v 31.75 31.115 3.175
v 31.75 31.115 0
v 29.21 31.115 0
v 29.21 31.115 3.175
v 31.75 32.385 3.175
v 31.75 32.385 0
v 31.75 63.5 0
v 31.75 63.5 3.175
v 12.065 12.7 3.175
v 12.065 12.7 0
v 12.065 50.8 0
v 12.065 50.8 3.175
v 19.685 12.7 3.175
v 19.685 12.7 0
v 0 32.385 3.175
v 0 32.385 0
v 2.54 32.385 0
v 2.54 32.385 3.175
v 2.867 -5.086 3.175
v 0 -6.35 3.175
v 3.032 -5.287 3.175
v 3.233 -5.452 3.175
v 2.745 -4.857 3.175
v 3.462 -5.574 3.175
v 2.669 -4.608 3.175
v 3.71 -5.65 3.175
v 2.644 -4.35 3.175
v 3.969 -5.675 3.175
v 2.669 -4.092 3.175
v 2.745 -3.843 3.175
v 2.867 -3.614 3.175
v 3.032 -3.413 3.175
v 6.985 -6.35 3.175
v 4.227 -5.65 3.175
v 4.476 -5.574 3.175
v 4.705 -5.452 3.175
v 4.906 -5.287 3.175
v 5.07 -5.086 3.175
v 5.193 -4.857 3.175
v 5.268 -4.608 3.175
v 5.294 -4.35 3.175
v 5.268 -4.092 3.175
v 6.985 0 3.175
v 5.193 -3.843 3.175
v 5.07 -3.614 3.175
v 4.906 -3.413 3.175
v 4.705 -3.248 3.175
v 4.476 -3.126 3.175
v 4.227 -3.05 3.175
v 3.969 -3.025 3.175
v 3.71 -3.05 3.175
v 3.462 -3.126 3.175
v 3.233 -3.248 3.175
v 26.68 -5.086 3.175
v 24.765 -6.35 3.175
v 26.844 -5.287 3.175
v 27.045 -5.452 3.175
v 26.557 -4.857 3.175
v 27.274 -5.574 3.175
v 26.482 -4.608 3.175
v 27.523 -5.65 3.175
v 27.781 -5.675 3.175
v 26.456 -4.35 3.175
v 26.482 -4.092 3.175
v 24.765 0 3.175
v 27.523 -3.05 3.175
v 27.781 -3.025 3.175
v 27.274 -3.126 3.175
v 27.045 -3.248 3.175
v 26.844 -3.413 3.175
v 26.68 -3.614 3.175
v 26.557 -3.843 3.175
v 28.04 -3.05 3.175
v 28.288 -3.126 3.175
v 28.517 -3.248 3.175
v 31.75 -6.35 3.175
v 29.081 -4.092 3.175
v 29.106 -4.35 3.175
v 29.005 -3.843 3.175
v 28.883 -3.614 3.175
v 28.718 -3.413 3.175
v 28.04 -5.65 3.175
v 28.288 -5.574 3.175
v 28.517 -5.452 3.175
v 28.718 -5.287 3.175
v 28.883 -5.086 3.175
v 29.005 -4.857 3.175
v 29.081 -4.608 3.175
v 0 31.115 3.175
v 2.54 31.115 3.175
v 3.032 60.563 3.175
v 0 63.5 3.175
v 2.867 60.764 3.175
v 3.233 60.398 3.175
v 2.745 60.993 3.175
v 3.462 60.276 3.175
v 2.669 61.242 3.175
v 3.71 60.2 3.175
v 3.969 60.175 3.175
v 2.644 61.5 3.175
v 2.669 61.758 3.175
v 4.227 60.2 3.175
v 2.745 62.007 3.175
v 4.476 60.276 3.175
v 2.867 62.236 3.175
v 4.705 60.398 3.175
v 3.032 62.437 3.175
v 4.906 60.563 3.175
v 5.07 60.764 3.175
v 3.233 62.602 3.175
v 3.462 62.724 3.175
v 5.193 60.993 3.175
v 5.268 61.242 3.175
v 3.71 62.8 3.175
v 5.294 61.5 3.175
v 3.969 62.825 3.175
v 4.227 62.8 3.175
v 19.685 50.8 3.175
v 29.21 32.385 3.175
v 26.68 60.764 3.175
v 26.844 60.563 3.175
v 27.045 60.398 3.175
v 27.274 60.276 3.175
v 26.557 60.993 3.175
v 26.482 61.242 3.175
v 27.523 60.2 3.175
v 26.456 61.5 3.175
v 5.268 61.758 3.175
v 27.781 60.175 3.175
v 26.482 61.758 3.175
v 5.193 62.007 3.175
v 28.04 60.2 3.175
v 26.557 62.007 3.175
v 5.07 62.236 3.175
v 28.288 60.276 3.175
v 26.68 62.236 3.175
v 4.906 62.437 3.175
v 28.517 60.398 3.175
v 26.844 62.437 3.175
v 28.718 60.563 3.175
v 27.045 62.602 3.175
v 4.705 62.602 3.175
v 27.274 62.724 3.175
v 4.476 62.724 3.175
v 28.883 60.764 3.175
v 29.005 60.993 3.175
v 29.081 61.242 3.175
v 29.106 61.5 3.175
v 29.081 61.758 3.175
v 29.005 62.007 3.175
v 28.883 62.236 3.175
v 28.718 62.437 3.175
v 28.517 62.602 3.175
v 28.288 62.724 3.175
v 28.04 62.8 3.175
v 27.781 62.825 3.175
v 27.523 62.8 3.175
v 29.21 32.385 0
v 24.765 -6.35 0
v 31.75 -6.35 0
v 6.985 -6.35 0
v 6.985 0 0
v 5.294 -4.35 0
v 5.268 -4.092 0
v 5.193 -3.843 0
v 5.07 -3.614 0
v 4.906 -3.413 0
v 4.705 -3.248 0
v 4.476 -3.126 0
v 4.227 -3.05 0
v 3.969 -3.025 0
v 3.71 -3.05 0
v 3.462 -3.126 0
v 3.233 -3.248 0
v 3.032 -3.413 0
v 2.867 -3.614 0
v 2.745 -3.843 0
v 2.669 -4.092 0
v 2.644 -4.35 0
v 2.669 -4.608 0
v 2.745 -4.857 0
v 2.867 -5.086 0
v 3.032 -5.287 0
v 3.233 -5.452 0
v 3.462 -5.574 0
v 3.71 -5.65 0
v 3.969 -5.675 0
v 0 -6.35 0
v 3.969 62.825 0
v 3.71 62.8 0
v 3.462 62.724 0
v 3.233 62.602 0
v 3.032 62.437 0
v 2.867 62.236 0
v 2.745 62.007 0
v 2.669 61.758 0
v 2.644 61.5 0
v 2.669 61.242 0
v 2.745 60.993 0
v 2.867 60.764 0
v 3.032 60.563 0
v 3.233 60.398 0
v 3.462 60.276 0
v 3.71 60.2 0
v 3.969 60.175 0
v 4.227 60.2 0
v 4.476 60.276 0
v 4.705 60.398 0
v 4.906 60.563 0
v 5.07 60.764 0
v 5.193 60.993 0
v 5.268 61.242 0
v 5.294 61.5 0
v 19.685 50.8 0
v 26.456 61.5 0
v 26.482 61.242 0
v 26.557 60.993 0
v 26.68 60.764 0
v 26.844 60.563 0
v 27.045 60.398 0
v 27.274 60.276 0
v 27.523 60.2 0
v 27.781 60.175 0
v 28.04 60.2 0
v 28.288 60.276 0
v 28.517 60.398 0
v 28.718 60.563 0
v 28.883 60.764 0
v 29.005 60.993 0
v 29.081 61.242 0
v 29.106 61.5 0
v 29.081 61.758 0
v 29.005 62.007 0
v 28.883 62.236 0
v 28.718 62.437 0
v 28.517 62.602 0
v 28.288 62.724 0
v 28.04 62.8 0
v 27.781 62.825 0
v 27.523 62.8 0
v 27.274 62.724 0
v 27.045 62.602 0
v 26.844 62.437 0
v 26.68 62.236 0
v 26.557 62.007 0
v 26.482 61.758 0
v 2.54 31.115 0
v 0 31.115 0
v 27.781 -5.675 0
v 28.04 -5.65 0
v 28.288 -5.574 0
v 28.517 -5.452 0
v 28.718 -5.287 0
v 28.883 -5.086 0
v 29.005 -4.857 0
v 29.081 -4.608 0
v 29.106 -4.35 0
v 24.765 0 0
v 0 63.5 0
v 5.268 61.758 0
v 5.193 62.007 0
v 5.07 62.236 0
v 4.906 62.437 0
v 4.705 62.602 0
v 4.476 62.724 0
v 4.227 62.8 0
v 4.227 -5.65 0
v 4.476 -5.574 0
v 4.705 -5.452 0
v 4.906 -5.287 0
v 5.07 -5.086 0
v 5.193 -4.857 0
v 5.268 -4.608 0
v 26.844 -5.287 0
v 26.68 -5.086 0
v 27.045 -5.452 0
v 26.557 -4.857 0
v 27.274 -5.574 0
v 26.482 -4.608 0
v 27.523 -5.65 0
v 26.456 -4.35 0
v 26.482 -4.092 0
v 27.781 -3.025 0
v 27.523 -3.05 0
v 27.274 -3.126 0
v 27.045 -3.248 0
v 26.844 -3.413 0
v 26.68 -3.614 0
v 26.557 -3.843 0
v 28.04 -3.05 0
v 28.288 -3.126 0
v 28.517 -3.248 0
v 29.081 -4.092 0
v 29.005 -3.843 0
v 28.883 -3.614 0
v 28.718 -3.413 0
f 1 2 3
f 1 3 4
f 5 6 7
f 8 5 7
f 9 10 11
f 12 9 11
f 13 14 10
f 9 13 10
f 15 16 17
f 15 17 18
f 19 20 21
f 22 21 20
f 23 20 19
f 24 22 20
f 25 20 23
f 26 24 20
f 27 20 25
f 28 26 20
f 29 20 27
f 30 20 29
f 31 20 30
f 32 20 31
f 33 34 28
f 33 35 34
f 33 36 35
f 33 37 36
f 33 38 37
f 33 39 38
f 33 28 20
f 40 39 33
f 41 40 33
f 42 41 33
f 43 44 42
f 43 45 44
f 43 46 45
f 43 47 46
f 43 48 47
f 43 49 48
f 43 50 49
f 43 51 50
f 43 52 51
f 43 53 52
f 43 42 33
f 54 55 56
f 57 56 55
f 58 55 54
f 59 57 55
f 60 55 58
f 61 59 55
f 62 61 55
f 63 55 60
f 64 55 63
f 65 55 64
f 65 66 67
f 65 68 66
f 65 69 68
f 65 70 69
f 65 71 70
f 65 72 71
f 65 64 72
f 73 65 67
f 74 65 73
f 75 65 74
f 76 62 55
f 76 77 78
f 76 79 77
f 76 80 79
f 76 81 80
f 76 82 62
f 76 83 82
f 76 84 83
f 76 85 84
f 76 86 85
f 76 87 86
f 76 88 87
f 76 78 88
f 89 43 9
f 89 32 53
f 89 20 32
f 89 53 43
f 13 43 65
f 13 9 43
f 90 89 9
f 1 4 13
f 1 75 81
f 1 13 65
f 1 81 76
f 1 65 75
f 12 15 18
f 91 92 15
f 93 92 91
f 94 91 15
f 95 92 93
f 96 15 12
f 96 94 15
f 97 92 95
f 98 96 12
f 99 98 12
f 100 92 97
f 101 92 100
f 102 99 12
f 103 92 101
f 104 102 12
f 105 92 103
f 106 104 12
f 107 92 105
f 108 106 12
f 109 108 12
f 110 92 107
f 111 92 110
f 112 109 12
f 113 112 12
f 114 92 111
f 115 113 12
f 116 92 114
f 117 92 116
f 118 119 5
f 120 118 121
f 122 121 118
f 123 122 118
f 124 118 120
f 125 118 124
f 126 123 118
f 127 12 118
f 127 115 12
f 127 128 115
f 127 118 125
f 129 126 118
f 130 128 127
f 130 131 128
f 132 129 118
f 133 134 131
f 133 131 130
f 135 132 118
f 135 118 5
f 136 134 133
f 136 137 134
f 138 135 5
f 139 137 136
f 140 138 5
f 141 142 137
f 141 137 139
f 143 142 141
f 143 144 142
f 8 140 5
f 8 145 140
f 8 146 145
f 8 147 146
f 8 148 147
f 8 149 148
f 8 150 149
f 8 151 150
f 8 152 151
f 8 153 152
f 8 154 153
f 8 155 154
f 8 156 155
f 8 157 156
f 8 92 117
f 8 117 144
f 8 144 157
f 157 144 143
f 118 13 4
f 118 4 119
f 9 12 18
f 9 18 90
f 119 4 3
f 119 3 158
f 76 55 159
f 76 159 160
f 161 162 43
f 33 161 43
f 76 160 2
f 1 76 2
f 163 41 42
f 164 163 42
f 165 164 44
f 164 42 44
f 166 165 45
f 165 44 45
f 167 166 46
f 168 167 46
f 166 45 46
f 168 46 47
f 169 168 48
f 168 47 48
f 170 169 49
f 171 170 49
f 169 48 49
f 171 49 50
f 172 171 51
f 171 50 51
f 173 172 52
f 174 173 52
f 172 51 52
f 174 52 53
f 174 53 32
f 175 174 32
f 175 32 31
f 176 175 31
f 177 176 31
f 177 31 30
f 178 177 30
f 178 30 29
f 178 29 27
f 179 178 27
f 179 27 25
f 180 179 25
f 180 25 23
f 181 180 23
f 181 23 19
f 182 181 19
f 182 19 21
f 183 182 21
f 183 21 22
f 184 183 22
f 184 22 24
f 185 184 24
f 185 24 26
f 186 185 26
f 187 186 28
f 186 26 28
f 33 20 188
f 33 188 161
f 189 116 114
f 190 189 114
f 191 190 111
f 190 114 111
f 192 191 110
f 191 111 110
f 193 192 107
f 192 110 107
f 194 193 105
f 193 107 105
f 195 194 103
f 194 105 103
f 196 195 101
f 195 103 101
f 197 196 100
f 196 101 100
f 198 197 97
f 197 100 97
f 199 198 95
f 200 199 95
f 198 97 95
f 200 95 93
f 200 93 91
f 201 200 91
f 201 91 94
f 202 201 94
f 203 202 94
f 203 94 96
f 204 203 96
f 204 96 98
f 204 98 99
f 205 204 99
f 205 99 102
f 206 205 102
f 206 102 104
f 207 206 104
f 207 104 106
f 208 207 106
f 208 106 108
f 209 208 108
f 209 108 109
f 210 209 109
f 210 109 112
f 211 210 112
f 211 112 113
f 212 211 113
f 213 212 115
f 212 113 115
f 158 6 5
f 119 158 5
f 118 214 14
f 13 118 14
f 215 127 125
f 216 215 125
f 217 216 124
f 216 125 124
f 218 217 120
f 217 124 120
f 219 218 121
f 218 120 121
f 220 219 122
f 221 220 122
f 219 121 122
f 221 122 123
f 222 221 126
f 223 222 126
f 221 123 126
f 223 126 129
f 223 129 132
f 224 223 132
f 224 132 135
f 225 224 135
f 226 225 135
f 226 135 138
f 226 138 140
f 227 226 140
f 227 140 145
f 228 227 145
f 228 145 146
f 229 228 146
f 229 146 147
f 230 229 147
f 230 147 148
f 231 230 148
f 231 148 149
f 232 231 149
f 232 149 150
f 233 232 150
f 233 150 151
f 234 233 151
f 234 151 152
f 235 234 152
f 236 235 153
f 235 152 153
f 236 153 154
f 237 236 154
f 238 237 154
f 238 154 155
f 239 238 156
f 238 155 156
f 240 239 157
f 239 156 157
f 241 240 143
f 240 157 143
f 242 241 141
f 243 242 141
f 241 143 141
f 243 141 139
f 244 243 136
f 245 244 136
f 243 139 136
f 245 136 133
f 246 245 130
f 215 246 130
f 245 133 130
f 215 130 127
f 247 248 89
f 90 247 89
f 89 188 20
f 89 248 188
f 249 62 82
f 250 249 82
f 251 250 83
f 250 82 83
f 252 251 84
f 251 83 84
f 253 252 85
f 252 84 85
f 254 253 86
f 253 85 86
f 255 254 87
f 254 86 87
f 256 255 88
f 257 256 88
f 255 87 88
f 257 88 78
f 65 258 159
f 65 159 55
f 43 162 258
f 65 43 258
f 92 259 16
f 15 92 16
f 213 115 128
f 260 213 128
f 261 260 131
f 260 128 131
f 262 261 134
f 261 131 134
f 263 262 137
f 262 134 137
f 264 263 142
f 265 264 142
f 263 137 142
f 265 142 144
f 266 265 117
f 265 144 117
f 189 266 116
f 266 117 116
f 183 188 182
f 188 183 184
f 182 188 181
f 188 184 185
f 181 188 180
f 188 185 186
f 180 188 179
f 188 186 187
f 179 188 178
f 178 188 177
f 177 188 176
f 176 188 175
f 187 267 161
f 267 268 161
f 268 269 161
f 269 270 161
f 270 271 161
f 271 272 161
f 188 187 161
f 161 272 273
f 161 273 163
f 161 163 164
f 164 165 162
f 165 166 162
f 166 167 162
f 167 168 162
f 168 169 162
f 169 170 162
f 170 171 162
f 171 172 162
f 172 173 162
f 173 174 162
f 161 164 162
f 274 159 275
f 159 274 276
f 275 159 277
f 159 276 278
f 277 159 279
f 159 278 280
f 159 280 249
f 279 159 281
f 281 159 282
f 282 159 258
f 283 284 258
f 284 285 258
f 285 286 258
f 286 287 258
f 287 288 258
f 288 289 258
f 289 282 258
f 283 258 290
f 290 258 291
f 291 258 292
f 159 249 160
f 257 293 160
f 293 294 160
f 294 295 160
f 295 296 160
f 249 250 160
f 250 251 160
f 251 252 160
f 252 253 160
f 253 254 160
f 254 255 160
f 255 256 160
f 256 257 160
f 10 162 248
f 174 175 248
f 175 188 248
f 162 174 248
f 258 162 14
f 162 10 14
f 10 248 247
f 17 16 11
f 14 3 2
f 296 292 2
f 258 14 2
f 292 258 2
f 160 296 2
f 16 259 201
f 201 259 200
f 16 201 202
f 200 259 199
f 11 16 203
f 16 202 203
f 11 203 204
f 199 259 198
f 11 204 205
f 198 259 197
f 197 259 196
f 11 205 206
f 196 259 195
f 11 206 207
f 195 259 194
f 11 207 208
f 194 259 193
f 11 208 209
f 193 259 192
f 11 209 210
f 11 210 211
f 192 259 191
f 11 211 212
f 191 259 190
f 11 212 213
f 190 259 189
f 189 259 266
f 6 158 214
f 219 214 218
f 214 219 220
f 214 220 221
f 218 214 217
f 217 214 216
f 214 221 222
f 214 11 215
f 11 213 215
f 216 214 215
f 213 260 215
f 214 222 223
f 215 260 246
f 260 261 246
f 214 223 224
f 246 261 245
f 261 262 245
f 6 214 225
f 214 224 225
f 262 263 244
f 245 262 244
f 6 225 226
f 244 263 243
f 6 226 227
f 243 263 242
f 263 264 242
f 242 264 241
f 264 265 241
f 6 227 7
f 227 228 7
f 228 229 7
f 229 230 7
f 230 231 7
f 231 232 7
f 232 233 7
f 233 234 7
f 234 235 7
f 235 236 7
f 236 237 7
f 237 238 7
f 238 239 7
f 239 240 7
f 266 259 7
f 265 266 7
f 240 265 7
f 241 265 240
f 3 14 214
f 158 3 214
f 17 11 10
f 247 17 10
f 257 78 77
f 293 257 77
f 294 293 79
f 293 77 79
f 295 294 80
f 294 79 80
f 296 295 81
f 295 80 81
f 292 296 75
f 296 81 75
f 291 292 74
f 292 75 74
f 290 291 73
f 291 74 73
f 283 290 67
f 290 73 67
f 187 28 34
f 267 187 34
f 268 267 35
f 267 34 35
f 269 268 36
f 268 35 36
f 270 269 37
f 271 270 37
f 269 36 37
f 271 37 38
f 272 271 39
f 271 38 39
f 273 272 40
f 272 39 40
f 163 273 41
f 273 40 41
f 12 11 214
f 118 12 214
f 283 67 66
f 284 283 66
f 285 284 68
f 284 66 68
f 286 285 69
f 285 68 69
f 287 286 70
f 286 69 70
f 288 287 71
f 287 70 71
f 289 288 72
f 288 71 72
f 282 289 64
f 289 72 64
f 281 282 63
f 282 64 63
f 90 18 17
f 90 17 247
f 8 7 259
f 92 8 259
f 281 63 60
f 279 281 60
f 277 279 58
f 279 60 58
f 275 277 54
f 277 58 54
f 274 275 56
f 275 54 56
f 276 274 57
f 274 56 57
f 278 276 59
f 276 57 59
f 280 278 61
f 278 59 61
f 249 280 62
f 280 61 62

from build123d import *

# Parameters (mm, degrees)
F1_DEPTH  = 3.175
F2_W      = 1.27
F2_H      = 3.175
F3_DEPTH  = 2.54
F4_W      = 1.27
F4_H      = 3.175
F5_DEPTH  = 2.54
F6_W      = 6.985
F6_H      = 3.175
F7_DEPTH  = 6.35
F9_DEPTH  = 25.4
F10_DEPTH = 25.4


# Not quite as in the source:
# - a feature names something its author has since deleted; it is built from what else it names


with BuildPart() as f1:
    # F0 (on Top) → F1 (new body)
    with BuildSketch(Plane.XY):
        Polygon((0, 63.5), (0, 0), (15.875, 0), (15.875, 12.7), (12.065, 12.7), (12.065, 50.8), (15.875, 50.8), (15.875, 63.5), align=None)
        Polygon((15.875, 12.7), (15.875, 0), (31.75, 0), (31.75, 63.5), (15.875, 63.5), (15.875, 50.8), (19.685, 50.8), (19.685, 12.7), align=None)
    extrude(amount=F1_DEPTH)

    # F2 (on face) → F3 (cut)
    with BuildSketch(Plane.YZ.offset(31.75)):
        with Locations((31.75, 1.5875)):
            Rectangle(F2_W, F2_H)
    extrude(amount=-F3_DEPTH, mode=Mode.SUBTRACT)

    # F4 (on face) → F5 (cut)
    with BuildSketch(Plane(origin=(0, 0, 0), x_dir=(0, -1, 0), z_dir=(-1, 0, 0))):
        with Locations((-31.75, 1.5875)):
            Rectangle(F4_W, F4_H)
    extrude(amount=-F5_DEPTH, mode=Mode.SUBTRACT)

    # F6 (on face) → F7 (join)
    with BuildSketch(Plane.XZ):
        with Locations((3.4925, 1.5875)):
            Rectangle(F6_W, F6_H)
        with Locations((28.2575, 1.5875)):
            Rectangle(F6_W, F6_H)
    extrude(amount=F7_DEPTH)

    # F8 (on face) → F9 (cut)
    with BuildSketch(Plane.XY.offset(3.175)):
        with BuildLine():
            ThreePointArc((5.29375, -4.35), (3.0318335149, -3.4130835149), (3.96875, -5.675))
            Line((3.96875, -5.675), (3.96875, -4.35))
            Line((3.96875, -4.35), (5.29375, -4.35))
        make_face()
        with BuildLine():
            Line((3.96875, -4.35), (3.96875, -5.675))
            ThreePointArc((3.96875, -5.675), (4.9056664851, -5.2869164851), (5.29375, -4.35))
            Line((5.29375, -4.35), (3.96875, -4.35))
        make_face()
        with BuildLine():
            ThreePointArc((27.78125, -3.025), (26.8443335149, -3.4130835149), (26.45625, -4.35))
            Line((26.45625, -4.35), (27.78125, -4.35))
            Line((27.78125, -4.35), (27.78125, -3.025))
        make_face()
    extrude(amount=-F9_DEPTH, mode=Mode.SUBTRACT)

    # F8 (on face) → F10 (cut)
    with BuildSketch(Plane.XY.offset(3.175)):
        with BuildLine():
            ThreePointArc((29.10625, 61.5), (27.78125, 62.825), (26.45625, 61.5))
            ThreePointArc((26.45625, 61.5), (27.78125, 60.175), (29.10625, 61.5))
        make_face()
        with BuildLine():
            ThreePointArc((5.29375, 61.5), (4.9056664851, 62.4369164851), (3.96875, 62.825))
            ThreePointArc((3.96875, 62.825), (3.0318335149, 60.5630835149), (5.29375, 61.5))
        make_face()
        with BuildLine():
            Line((27.78125, -4.35), (26.45625, -4.35))
            ThreePointArc((26.45625, -4.35), (26.8443335149, -5.2869164851), (27.78125, -5.675))
            ThreePointArc((27.78125, -5.675), (28.7181664851, -5.2869164851), (29.10625, -4.35))
            ThreePointArc((29.10625, -4.35), (28.7181664851, -3.4130835149), (27.78125, -3.025))
            Line((27.78125, -3.025), (27.78125, -4.35))
        make_face()
    extrude(amount=-F10_DEPTH, mode=Mode.SUBTRACT)


solid = f1.part
